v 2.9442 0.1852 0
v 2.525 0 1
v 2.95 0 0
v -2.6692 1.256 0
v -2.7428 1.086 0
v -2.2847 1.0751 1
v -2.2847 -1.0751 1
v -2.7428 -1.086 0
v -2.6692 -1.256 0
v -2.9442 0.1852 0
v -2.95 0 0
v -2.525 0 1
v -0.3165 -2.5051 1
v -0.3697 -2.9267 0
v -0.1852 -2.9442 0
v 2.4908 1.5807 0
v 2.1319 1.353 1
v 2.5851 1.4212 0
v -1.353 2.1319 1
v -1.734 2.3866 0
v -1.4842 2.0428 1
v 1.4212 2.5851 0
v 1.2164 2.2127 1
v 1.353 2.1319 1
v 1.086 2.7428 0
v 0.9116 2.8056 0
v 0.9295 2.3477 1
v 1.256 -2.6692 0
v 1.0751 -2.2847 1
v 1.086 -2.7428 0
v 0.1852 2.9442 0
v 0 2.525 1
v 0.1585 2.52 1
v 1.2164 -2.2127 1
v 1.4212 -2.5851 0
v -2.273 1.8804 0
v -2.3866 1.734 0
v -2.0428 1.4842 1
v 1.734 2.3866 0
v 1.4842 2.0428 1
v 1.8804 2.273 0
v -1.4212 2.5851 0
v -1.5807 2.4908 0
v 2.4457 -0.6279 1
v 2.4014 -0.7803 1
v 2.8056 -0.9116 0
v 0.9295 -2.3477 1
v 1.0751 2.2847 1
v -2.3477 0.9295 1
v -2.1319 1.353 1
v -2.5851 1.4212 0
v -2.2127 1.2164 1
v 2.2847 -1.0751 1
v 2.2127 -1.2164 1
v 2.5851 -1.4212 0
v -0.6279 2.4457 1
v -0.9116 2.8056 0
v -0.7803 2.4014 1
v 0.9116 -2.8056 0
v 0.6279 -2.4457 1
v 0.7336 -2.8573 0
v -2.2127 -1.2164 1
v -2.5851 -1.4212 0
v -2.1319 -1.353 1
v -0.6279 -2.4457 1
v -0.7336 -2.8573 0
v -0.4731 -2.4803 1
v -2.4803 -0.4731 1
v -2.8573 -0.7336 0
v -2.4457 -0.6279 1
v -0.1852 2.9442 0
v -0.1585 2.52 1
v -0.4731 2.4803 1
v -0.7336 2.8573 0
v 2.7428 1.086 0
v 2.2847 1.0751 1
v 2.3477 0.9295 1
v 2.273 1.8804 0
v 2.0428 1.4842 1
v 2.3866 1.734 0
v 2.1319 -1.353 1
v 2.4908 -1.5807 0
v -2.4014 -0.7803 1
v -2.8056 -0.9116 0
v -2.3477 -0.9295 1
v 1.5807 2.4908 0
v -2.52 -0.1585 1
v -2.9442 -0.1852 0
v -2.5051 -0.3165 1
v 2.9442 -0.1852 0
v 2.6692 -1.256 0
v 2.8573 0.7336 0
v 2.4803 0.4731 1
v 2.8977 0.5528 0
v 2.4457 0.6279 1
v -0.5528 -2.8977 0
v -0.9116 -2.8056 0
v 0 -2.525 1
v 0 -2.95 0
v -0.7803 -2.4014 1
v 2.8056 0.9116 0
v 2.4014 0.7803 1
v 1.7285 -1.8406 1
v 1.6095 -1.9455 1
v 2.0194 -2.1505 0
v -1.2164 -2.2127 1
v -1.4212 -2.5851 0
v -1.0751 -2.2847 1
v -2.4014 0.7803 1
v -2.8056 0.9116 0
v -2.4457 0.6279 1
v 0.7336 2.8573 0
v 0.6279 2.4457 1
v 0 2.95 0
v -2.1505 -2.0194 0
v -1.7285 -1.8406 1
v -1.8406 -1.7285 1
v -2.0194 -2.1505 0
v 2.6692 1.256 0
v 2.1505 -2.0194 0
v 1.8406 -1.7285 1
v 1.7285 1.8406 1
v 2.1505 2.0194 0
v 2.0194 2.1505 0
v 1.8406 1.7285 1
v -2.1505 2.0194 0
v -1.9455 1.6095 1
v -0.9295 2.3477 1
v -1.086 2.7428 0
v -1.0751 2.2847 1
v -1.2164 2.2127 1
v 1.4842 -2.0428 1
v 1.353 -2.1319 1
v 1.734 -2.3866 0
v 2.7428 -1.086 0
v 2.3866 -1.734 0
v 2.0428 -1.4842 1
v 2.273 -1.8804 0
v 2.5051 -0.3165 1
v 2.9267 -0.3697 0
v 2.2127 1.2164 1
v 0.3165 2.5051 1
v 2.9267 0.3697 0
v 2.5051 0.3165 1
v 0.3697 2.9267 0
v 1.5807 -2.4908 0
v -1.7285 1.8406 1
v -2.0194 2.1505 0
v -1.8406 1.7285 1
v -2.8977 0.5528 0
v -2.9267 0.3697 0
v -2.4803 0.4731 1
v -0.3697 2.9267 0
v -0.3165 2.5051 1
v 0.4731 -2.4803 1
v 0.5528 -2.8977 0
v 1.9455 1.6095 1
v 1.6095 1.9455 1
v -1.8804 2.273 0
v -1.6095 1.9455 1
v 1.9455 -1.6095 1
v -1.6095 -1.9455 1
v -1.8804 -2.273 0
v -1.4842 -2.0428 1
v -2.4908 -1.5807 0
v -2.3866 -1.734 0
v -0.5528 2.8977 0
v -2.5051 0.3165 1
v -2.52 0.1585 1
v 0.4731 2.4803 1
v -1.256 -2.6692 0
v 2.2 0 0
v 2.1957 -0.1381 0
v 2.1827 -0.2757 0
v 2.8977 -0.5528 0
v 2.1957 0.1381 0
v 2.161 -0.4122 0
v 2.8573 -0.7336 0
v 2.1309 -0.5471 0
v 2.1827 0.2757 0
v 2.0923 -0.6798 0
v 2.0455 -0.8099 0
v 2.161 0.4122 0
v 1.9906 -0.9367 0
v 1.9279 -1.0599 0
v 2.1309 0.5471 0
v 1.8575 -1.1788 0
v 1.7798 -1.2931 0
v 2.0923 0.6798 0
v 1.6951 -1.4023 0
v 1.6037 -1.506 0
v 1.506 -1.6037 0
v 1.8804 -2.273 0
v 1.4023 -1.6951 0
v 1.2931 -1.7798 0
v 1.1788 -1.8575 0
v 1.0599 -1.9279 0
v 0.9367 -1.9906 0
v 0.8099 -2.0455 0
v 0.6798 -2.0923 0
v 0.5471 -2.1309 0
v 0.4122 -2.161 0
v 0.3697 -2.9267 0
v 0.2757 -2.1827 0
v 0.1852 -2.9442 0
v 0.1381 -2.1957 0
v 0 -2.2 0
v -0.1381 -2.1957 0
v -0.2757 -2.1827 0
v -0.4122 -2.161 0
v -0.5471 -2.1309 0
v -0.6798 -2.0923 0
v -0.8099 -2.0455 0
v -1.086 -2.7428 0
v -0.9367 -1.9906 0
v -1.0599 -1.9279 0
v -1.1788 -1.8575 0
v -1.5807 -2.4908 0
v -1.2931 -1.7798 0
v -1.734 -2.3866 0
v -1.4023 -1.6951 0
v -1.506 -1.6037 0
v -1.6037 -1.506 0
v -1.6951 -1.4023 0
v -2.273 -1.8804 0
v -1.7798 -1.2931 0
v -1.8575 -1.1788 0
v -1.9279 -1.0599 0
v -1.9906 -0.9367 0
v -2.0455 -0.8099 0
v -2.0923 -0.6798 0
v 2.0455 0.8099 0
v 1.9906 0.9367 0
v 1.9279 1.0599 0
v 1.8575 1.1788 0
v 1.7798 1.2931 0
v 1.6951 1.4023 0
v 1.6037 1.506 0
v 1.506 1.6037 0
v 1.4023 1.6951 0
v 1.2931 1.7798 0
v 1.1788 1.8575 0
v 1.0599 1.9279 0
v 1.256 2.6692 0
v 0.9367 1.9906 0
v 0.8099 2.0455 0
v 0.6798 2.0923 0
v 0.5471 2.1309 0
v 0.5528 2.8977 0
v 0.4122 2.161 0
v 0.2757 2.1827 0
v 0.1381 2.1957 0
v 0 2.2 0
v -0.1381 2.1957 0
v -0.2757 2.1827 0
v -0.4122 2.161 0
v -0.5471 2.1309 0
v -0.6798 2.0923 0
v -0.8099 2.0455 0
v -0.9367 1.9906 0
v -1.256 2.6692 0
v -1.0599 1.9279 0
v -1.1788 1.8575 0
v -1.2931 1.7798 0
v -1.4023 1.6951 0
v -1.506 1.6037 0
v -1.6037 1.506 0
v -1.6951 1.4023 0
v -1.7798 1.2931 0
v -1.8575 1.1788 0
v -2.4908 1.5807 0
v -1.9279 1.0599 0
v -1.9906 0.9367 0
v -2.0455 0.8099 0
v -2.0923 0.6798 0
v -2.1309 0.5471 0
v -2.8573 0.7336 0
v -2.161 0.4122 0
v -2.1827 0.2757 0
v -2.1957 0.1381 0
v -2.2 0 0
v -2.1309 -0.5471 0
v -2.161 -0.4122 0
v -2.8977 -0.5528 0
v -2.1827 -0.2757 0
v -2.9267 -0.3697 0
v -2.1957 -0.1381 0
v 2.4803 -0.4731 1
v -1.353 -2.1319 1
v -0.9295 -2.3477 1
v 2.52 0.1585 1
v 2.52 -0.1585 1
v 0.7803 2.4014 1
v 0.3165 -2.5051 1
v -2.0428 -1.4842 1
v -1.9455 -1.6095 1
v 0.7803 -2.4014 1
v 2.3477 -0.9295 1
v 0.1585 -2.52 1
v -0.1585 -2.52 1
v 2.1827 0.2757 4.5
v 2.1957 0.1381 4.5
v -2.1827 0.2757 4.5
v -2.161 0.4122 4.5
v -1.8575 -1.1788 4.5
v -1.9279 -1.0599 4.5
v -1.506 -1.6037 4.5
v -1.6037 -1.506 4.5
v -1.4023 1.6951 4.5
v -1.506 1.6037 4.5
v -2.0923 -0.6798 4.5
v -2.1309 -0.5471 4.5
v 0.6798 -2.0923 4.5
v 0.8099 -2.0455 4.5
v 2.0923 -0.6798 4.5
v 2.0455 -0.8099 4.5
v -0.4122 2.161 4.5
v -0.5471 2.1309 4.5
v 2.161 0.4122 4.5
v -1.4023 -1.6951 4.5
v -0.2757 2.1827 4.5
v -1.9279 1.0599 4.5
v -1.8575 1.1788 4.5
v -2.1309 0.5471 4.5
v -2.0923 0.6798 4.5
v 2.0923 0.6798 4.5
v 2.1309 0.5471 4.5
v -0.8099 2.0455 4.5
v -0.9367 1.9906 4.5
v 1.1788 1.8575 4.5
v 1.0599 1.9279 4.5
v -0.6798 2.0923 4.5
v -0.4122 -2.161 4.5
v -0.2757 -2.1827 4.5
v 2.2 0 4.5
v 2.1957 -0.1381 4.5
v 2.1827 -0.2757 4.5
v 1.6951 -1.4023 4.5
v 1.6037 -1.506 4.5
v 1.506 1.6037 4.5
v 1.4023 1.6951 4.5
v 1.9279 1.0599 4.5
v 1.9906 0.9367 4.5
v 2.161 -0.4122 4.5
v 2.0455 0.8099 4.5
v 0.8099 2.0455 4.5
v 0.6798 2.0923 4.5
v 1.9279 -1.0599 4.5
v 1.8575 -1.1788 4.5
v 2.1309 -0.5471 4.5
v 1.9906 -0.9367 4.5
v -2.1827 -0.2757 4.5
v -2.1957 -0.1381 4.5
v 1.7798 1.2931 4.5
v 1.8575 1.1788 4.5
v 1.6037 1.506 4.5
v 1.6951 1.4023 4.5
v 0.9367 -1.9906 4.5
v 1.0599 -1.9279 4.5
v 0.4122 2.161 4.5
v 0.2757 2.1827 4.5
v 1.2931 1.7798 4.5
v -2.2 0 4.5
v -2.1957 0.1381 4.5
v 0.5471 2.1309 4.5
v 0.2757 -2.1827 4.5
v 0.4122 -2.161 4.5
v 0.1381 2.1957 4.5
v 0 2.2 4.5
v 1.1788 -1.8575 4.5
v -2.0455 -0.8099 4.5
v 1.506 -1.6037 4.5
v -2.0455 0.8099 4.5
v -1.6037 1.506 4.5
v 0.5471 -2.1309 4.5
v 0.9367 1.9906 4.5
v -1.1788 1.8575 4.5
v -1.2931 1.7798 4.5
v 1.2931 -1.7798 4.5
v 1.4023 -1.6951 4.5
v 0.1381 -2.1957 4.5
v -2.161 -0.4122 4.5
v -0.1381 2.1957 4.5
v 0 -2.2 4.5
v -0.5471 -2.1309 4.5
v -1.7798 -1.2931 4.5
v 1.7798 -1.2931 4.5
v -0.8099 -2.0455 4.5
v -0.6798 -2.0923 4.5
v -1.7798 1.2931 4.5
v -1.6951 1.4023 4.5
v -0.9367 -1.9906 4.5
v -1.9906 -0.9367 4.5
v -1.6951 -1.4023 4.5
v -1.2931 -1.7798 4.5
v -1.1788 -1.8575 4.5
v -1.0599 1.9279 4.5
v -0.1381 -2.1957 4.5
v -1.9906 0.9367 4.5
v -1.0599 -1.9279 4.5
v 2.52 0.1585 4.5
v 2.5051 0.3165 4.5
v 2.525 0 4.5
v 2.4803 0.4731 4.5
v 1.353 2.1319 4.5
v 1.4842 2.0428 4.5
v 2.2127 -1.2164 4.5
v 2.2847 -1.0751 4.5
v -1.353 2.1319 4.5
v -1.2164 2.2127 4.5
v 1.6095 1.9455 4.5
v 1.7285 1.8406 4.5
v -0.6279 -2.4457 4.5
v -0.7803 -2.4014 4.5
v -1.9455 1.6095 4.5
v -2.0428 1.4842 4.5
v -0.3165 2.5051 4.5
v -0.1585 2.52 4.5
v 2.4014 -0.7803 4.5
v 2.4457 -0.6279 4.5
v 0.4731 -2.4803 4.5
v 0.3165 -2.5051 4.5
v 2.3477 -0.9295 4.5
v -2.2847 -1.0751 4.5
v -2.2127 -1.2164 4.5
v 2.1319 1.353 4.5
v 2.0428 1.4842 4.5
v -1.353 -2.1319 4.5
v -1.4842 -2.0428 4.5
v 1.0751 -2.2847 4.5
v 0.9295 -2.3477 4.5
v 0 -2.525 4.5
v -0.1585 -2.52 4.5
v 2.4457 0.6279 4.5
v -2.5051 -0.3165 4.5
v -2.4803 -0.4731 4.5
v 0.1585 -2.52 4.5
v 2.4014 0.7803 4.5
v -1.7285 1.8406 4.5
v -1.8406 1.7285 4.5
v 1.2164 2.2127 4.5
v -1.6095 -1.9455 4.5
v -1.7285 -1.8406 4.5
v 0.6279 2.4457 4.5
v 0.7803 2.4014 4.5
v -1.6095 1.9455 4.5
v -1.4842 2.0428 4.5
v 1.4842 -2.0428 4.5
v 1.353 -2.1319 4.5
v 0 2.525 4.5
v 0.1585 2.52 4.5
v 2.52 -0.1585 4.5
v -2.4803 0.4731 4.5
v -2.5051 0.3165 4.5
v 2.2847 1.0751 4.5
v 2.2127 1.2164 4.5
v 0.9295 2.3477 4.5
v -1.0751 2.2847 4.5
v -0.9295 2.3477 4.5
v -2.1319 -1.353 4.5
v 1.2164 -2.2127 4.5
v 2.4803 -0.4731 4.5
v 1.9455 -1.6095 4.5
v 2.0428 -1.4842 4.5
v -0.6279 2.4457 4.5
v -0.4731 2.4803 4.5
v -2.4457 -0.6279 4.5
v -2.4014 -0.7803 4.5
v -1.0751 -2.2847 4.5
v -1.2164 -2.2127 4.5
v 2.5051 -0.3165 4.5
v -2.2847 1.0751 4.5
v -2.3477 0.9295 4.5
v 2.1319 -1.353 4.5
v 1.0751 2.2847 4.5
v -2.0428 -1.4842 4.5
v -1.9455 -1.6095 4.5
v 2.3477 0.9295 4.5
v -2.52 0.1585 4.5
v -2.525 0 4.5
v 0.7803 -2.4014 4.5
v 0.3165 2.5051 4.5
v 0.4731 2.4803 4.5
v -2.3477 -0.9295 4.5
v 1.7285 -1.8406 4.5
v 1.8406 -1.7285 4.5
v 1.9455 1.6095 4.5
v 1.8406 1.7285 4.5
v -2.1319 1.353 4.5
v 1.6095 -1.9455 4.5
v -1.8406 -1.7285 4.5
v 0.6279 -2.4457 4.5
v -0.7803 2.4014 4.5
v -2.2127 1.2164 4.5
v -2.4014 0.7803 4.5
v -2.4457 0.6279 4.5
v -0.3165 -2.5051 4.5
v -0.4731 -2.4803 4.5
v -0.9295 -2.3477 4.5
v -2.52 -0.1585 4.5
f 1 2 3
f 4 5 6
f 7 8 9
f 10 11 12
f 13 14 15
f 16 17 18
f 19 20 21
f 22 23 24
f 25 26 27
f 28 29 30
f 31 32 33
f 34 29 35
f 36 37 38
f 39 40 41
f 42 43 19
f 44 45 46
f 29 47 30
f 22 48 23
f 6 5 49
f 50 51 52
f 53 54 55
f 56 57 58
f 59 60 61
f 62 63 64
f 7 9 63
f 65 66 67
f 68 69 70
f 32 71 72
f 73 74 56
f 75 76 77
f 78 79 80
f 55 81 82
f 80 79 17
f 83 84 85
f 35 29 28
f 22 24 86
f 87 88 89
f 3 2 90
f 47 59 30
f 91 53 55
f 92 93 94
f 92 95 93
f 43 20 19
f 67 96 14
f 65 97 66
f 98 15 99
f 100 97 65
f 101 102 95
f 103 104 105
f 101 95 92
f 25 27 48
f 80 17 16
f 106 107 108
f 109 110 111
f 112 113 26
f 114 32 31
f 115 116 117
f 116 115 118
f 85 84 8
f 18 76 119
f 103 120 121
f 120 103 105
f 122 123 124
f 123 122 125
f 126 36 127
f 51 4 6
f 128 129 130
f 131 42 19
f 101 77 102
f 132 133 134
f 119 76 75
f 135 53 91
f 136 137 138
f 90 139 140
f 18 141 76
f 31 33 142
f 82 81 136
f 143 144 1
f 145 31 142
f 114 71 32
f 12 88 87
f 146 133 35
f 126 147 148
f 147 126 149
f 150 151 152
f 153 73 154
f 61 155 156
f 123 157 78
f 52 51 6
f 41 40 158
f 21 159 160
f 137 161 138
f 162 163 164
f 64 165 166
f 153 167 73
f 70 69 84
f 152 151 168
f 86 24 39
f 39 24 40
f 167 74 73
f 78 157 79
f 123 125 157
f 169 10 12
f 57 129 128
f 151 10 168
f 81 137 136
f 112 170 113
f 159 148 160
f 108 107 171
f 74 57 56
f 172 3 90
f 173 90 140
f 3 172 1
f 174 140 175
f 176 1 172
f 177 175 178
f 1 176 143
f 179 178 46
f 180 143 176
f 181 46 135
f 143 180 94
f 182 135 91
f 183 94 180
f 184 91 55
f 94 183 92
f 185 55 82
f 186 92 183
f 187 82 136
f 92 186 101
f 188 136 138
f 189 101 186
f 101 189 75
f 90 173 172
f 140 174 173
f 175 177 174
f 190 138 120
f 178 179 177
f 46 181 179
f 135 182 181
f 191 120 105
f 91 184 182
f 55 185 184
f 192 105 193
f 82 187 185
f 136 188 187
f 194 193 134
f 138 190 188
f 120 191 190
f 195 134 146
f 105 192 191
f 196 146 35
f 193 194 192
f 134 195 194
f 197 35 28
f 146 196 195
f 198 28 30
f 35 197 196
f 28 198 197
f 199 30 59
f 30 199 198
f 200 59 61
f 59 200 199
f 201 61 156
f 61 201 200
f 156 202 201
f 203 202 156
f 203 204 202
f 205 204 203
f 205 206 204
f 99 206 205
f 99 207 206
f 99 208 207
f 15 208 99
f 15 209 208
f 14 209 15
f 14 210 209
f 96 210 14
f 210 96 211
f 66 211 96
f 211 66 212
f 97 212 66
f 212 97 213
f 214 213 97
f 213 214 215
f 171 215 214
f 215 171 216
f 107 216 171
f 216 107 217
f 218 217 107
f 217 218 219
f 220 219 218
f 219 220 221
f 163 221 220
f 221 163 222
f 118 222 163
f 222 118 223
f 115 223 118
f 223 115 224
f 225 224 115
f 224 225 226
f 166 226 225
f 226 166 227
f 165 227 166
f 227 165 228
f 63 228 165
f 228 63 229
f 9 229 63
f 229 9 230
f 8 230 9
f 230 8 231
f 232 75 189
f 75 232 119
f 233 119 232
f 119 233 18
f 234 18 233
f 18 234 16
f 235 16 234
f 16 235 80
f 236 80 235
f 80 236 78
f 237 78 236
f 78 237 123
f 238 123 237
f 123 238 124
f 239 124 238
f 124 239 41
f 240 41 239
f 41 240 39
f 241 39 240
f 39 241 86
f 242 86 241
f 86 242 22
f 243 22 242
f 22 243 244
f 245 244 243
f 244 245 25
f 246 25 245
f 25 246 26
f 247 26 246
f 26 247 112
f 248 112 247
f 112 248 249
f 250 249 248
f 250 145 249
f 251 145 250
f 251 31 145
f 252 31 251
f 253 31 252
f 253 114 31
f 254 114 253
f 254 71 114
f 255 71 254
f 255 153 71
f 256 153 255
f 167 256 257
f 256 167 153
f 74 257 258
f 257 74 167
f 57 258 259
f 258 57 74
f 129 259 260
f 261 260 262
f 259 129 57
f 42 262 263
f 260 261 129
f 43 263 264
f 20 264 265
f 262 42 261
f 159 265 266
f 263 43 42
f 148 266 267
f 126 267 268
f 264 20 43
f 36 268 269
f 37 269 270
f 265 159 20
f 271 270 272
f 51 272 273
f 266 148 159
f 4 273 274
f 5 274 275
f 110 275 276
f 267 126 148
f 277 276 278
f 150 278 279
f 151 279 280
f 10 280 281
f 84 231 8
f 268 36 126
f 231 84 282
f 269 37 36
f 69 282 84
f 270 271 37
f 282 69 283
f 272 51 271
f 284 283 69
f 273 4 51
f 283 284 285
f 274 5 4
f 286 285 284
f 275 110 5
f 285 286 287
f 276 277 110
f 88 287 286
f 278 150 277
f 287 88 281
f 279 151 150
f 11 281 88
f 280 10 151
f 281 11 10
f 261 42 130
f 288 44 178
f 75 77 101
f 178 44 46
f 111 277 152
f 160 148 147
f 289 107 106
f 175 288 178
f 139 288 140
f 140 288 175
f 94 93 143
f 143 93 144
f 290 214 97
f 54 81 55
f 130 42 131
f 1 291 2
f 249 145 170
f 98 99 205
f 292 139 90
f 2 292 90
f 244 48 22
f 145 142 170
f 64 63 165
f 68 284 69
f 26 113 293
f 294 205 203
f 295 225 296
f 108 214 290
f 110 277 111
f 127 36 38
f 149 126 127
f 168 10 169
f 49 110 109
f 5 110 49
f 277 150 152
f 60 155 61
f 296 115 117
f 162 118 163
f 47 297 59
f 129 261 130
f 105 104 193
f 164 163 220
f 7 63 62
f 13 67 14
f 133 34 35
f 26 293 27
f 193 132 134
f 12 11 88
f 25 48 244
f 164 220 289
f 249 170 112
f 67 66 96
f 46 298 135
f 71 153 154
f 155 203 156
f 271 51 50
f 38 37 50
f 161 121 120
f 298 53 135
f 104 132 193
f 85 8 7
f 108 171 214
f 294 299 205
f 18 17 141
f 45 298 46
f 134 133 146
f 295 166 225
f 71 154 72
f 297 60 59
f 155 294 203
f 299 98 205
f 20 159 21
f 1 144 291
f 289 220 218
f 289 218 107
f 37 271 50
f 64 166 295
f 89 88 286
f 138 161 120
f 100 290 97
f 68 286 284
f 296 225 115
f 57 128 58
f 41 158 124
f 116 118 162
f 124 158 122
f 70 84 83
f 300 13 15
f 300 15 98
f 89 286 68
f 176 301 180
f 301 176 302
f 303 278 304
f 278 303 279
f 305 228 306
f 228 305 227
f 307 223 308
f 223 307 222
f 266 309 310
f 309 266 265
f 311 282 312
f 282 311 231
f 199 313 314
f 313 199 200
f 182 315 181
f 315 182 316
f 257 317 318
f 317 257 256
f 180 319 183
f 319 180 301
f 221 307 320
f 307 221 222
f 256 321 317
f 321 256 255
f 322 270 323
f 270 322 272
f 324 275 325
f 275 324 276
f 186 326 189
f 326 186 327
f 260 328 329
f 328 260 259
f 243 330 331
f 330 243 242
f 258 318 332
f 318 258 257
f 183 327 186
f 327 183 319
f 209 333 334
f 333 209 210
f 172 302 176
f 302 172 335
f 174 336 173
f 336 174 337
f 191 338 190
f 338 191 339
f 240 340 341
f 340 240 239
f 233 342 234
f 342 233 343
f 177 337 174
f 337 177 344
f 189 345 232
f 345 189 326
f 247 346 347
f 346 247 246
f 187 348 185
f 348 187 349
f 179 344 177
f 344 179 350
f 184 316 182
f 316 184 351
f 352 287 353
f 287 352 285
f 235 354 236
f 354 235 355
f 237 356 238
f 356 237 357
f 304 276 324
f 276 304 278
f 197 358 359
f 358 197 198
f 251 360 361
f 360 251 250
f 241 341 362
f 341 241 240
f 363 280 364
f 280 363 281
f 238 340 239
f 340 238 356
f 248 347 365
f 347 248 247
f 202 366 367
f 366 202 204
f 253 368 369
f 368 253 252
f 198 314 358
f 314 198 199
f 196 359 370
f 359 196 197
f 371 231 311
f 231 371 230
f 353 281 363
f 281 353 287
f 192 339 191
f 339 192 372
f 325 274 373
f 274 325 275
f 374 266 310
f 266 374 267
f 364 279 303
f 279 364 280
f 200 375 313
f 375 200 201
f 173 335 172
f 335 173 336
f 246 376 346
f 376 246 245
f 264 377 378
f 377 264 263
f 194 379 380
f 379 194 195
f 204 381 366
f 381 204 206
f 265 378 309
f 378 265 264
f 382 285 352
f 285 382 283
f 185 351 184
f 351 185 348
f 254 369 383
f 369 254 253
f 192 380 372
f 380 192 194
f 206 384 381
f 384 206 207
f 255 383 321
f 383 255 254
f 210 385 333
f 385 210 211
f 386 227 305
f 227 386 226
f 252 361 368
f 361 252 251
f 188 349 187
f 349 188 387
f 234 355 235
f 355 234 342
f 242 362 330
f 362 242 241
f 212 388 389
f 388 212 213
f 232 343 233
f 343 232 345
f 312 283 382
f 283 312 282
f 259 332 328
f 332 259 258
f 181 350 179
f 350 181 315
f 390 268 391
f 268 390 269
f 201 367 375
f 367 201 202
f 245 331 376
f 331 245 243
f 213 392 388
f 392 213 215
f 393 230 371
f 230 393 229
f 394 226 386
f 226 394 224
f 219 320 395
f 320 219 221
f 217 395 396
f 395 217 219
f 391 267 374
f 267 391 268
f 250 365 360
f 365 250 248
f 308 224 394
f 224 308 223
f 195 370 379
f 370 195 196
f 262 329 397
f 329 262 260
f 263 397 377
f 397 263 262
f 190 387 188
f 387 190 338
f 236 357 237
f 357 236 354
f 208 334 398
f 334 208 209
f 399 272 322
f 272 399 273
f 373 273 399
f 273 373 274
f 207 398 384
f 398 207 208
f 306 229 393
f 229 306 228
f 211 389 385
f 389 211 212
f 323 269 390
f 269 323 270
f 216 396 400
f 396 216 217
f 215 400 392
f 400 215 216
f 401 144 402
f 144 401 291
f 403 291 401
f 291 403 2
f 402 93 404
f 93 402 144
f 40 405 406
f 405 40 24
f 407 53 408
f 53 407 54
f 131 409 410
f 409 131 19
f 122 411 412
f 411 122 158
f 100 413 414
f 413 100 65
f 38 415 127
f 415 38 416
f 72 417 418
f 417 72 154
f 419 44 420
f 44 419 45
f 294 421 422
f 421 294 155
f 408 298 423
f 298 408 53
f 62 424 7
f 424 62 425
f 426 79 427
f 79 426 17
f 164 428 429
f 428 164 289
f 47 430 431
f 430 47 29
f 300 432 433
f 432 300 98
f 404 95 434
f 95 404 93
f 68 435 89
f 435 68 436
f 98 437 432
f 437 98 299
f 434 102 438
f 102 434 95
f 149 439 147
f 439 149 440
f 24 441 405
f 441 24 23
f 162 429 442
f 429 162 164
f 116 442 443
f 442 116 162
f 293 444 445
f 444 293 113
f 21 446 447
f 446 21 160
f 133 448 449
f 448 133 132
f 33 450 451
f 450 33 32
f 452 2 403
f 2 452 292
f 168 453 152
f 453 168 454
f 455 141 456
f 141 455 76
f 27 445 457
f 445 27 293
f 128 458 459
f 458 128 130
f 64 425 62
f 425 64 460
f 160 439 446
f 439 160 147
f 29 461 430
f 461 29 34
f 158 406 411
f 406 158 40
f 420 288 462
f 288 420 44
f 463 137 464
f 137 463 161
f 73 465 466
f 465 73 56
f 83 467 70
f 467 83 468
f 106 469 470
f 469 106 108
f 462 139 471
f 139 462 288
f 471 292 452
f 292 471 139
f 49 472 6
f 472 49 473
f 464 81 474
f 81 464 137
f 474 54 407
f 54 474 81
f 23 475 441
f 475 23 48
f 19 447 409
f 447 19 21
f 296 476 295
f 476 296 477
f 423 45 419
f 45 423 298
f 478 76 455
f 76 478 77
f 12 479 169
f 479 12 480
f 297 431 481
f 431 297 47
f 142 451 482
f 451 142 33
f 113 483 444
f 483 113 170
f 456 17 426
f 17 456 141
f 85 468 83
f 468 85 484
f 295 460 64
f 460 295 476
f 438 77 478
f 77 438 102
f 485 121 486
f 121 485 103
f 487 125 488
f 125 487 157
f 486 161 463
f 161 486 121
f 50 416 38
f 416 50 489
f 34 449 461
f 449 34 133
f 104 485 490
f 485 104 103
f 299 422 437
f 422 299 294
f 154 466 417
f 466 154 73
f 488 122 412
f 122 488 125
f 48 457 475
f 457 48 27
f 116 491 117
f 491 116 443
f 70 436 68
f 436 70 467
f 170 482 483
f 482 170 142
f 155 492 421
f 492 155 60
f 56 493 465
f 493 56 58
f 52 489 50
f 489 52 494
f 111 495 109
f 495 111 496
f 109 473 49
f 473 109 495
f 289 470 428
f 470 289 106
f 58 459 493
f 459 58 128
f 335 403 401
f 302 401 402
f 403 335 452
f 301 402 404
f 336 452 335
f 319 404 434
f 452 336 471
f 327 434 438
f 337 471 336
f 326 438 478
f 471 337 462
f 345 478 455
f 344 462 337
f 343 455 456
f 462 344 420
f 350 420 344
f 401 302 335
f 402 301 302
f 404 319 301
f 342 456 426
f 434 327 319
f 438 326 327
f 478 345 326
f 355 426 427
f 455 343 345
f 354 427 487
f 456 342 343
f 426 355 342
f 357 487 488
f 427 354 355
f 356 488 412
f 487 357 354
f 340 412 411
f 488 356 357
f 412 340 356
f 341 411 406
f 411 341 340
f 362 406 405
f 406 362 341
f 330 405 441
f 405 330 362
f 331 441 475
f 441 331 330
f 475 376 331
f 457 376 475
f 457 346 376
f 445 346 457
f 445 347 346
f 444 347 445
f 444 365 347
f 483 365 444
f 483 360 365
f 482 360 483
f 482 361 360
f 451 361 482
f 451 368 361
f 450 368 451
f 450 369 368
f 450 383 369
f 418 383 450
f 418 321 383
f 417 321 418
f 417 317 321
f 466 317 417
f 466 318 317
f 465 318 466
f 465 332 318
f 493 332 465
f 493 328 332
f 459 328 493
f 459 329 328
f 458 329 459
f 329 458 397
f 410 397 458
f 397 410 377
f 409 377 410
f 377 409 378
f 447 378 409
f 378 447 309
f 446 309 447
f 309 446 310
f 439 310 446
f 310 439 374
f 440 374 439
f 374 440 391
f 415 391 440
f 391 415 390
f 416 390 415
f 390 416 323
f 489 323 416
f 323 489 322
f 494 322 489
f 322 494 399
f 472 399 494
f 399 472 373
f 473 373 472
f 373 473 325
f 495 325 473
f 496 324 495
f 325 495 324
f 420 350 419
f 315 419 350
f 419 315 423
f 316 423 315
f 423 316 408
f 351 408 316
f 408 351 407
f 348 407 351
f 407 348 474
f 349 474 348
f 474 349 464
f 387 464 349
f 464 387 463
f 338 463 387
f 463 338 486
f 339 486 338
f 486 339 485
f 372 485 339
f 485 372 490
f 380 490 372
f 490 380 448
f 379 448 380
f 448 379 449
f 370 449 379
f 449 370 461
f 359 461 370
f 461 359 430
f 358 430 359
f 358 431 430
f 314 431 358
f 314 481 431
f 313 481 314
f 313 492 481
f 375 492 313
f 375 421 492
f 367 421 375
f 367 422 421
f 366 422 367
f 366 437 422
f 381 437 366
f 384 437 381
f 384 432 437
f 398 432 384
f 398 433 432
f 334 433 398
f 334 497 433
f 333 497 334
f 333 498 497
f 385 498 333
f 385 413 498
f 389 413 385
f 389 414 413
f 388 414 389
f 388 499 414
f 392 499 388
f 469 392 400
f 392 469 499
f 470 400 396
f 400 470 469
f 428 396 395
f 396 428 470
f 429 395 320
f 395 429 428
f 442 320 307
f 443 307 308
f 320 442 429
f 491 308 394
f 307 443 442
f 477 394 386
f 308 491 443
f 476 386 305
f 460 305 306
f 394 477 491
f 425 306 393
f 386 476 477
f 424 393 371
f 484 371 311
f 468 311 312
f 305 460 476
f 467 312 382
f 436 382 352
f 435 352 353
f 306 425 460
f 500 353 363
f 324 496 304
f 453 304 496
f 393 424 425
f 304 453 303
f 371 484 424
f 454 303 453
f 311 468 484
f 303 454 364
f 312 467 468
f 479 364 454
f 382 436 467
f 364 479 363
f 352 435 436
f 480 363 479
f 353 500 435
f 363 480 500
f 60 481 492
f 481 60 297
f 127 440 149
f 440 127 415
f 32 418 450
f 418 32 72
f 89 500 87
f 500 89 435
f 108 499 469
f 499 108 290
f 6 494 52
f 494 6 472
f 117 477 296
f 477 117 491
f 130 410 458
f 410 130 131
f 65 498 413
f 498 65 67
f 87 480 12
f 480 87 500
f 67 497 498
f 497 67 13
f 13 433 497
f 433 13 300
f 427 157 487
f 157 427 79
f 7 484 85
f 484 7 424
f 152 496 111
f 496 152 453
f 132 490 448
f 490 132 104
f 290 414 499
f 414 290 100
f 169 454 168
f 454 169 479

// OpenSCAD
difference() {
    cylinder(r1 = 2.95, r2 = 2.525, h = 1, $fn = 100);

cylinder(d = 4.4, h = 4, $fn = 100);
}
difference() {
translate([0,0,1]) {
        cylinder(d = 5.05, h = 3.5, $fn = 100);
    }
    #cylinder(d = 4.4, h = 4.5, $fn = 100);
}
